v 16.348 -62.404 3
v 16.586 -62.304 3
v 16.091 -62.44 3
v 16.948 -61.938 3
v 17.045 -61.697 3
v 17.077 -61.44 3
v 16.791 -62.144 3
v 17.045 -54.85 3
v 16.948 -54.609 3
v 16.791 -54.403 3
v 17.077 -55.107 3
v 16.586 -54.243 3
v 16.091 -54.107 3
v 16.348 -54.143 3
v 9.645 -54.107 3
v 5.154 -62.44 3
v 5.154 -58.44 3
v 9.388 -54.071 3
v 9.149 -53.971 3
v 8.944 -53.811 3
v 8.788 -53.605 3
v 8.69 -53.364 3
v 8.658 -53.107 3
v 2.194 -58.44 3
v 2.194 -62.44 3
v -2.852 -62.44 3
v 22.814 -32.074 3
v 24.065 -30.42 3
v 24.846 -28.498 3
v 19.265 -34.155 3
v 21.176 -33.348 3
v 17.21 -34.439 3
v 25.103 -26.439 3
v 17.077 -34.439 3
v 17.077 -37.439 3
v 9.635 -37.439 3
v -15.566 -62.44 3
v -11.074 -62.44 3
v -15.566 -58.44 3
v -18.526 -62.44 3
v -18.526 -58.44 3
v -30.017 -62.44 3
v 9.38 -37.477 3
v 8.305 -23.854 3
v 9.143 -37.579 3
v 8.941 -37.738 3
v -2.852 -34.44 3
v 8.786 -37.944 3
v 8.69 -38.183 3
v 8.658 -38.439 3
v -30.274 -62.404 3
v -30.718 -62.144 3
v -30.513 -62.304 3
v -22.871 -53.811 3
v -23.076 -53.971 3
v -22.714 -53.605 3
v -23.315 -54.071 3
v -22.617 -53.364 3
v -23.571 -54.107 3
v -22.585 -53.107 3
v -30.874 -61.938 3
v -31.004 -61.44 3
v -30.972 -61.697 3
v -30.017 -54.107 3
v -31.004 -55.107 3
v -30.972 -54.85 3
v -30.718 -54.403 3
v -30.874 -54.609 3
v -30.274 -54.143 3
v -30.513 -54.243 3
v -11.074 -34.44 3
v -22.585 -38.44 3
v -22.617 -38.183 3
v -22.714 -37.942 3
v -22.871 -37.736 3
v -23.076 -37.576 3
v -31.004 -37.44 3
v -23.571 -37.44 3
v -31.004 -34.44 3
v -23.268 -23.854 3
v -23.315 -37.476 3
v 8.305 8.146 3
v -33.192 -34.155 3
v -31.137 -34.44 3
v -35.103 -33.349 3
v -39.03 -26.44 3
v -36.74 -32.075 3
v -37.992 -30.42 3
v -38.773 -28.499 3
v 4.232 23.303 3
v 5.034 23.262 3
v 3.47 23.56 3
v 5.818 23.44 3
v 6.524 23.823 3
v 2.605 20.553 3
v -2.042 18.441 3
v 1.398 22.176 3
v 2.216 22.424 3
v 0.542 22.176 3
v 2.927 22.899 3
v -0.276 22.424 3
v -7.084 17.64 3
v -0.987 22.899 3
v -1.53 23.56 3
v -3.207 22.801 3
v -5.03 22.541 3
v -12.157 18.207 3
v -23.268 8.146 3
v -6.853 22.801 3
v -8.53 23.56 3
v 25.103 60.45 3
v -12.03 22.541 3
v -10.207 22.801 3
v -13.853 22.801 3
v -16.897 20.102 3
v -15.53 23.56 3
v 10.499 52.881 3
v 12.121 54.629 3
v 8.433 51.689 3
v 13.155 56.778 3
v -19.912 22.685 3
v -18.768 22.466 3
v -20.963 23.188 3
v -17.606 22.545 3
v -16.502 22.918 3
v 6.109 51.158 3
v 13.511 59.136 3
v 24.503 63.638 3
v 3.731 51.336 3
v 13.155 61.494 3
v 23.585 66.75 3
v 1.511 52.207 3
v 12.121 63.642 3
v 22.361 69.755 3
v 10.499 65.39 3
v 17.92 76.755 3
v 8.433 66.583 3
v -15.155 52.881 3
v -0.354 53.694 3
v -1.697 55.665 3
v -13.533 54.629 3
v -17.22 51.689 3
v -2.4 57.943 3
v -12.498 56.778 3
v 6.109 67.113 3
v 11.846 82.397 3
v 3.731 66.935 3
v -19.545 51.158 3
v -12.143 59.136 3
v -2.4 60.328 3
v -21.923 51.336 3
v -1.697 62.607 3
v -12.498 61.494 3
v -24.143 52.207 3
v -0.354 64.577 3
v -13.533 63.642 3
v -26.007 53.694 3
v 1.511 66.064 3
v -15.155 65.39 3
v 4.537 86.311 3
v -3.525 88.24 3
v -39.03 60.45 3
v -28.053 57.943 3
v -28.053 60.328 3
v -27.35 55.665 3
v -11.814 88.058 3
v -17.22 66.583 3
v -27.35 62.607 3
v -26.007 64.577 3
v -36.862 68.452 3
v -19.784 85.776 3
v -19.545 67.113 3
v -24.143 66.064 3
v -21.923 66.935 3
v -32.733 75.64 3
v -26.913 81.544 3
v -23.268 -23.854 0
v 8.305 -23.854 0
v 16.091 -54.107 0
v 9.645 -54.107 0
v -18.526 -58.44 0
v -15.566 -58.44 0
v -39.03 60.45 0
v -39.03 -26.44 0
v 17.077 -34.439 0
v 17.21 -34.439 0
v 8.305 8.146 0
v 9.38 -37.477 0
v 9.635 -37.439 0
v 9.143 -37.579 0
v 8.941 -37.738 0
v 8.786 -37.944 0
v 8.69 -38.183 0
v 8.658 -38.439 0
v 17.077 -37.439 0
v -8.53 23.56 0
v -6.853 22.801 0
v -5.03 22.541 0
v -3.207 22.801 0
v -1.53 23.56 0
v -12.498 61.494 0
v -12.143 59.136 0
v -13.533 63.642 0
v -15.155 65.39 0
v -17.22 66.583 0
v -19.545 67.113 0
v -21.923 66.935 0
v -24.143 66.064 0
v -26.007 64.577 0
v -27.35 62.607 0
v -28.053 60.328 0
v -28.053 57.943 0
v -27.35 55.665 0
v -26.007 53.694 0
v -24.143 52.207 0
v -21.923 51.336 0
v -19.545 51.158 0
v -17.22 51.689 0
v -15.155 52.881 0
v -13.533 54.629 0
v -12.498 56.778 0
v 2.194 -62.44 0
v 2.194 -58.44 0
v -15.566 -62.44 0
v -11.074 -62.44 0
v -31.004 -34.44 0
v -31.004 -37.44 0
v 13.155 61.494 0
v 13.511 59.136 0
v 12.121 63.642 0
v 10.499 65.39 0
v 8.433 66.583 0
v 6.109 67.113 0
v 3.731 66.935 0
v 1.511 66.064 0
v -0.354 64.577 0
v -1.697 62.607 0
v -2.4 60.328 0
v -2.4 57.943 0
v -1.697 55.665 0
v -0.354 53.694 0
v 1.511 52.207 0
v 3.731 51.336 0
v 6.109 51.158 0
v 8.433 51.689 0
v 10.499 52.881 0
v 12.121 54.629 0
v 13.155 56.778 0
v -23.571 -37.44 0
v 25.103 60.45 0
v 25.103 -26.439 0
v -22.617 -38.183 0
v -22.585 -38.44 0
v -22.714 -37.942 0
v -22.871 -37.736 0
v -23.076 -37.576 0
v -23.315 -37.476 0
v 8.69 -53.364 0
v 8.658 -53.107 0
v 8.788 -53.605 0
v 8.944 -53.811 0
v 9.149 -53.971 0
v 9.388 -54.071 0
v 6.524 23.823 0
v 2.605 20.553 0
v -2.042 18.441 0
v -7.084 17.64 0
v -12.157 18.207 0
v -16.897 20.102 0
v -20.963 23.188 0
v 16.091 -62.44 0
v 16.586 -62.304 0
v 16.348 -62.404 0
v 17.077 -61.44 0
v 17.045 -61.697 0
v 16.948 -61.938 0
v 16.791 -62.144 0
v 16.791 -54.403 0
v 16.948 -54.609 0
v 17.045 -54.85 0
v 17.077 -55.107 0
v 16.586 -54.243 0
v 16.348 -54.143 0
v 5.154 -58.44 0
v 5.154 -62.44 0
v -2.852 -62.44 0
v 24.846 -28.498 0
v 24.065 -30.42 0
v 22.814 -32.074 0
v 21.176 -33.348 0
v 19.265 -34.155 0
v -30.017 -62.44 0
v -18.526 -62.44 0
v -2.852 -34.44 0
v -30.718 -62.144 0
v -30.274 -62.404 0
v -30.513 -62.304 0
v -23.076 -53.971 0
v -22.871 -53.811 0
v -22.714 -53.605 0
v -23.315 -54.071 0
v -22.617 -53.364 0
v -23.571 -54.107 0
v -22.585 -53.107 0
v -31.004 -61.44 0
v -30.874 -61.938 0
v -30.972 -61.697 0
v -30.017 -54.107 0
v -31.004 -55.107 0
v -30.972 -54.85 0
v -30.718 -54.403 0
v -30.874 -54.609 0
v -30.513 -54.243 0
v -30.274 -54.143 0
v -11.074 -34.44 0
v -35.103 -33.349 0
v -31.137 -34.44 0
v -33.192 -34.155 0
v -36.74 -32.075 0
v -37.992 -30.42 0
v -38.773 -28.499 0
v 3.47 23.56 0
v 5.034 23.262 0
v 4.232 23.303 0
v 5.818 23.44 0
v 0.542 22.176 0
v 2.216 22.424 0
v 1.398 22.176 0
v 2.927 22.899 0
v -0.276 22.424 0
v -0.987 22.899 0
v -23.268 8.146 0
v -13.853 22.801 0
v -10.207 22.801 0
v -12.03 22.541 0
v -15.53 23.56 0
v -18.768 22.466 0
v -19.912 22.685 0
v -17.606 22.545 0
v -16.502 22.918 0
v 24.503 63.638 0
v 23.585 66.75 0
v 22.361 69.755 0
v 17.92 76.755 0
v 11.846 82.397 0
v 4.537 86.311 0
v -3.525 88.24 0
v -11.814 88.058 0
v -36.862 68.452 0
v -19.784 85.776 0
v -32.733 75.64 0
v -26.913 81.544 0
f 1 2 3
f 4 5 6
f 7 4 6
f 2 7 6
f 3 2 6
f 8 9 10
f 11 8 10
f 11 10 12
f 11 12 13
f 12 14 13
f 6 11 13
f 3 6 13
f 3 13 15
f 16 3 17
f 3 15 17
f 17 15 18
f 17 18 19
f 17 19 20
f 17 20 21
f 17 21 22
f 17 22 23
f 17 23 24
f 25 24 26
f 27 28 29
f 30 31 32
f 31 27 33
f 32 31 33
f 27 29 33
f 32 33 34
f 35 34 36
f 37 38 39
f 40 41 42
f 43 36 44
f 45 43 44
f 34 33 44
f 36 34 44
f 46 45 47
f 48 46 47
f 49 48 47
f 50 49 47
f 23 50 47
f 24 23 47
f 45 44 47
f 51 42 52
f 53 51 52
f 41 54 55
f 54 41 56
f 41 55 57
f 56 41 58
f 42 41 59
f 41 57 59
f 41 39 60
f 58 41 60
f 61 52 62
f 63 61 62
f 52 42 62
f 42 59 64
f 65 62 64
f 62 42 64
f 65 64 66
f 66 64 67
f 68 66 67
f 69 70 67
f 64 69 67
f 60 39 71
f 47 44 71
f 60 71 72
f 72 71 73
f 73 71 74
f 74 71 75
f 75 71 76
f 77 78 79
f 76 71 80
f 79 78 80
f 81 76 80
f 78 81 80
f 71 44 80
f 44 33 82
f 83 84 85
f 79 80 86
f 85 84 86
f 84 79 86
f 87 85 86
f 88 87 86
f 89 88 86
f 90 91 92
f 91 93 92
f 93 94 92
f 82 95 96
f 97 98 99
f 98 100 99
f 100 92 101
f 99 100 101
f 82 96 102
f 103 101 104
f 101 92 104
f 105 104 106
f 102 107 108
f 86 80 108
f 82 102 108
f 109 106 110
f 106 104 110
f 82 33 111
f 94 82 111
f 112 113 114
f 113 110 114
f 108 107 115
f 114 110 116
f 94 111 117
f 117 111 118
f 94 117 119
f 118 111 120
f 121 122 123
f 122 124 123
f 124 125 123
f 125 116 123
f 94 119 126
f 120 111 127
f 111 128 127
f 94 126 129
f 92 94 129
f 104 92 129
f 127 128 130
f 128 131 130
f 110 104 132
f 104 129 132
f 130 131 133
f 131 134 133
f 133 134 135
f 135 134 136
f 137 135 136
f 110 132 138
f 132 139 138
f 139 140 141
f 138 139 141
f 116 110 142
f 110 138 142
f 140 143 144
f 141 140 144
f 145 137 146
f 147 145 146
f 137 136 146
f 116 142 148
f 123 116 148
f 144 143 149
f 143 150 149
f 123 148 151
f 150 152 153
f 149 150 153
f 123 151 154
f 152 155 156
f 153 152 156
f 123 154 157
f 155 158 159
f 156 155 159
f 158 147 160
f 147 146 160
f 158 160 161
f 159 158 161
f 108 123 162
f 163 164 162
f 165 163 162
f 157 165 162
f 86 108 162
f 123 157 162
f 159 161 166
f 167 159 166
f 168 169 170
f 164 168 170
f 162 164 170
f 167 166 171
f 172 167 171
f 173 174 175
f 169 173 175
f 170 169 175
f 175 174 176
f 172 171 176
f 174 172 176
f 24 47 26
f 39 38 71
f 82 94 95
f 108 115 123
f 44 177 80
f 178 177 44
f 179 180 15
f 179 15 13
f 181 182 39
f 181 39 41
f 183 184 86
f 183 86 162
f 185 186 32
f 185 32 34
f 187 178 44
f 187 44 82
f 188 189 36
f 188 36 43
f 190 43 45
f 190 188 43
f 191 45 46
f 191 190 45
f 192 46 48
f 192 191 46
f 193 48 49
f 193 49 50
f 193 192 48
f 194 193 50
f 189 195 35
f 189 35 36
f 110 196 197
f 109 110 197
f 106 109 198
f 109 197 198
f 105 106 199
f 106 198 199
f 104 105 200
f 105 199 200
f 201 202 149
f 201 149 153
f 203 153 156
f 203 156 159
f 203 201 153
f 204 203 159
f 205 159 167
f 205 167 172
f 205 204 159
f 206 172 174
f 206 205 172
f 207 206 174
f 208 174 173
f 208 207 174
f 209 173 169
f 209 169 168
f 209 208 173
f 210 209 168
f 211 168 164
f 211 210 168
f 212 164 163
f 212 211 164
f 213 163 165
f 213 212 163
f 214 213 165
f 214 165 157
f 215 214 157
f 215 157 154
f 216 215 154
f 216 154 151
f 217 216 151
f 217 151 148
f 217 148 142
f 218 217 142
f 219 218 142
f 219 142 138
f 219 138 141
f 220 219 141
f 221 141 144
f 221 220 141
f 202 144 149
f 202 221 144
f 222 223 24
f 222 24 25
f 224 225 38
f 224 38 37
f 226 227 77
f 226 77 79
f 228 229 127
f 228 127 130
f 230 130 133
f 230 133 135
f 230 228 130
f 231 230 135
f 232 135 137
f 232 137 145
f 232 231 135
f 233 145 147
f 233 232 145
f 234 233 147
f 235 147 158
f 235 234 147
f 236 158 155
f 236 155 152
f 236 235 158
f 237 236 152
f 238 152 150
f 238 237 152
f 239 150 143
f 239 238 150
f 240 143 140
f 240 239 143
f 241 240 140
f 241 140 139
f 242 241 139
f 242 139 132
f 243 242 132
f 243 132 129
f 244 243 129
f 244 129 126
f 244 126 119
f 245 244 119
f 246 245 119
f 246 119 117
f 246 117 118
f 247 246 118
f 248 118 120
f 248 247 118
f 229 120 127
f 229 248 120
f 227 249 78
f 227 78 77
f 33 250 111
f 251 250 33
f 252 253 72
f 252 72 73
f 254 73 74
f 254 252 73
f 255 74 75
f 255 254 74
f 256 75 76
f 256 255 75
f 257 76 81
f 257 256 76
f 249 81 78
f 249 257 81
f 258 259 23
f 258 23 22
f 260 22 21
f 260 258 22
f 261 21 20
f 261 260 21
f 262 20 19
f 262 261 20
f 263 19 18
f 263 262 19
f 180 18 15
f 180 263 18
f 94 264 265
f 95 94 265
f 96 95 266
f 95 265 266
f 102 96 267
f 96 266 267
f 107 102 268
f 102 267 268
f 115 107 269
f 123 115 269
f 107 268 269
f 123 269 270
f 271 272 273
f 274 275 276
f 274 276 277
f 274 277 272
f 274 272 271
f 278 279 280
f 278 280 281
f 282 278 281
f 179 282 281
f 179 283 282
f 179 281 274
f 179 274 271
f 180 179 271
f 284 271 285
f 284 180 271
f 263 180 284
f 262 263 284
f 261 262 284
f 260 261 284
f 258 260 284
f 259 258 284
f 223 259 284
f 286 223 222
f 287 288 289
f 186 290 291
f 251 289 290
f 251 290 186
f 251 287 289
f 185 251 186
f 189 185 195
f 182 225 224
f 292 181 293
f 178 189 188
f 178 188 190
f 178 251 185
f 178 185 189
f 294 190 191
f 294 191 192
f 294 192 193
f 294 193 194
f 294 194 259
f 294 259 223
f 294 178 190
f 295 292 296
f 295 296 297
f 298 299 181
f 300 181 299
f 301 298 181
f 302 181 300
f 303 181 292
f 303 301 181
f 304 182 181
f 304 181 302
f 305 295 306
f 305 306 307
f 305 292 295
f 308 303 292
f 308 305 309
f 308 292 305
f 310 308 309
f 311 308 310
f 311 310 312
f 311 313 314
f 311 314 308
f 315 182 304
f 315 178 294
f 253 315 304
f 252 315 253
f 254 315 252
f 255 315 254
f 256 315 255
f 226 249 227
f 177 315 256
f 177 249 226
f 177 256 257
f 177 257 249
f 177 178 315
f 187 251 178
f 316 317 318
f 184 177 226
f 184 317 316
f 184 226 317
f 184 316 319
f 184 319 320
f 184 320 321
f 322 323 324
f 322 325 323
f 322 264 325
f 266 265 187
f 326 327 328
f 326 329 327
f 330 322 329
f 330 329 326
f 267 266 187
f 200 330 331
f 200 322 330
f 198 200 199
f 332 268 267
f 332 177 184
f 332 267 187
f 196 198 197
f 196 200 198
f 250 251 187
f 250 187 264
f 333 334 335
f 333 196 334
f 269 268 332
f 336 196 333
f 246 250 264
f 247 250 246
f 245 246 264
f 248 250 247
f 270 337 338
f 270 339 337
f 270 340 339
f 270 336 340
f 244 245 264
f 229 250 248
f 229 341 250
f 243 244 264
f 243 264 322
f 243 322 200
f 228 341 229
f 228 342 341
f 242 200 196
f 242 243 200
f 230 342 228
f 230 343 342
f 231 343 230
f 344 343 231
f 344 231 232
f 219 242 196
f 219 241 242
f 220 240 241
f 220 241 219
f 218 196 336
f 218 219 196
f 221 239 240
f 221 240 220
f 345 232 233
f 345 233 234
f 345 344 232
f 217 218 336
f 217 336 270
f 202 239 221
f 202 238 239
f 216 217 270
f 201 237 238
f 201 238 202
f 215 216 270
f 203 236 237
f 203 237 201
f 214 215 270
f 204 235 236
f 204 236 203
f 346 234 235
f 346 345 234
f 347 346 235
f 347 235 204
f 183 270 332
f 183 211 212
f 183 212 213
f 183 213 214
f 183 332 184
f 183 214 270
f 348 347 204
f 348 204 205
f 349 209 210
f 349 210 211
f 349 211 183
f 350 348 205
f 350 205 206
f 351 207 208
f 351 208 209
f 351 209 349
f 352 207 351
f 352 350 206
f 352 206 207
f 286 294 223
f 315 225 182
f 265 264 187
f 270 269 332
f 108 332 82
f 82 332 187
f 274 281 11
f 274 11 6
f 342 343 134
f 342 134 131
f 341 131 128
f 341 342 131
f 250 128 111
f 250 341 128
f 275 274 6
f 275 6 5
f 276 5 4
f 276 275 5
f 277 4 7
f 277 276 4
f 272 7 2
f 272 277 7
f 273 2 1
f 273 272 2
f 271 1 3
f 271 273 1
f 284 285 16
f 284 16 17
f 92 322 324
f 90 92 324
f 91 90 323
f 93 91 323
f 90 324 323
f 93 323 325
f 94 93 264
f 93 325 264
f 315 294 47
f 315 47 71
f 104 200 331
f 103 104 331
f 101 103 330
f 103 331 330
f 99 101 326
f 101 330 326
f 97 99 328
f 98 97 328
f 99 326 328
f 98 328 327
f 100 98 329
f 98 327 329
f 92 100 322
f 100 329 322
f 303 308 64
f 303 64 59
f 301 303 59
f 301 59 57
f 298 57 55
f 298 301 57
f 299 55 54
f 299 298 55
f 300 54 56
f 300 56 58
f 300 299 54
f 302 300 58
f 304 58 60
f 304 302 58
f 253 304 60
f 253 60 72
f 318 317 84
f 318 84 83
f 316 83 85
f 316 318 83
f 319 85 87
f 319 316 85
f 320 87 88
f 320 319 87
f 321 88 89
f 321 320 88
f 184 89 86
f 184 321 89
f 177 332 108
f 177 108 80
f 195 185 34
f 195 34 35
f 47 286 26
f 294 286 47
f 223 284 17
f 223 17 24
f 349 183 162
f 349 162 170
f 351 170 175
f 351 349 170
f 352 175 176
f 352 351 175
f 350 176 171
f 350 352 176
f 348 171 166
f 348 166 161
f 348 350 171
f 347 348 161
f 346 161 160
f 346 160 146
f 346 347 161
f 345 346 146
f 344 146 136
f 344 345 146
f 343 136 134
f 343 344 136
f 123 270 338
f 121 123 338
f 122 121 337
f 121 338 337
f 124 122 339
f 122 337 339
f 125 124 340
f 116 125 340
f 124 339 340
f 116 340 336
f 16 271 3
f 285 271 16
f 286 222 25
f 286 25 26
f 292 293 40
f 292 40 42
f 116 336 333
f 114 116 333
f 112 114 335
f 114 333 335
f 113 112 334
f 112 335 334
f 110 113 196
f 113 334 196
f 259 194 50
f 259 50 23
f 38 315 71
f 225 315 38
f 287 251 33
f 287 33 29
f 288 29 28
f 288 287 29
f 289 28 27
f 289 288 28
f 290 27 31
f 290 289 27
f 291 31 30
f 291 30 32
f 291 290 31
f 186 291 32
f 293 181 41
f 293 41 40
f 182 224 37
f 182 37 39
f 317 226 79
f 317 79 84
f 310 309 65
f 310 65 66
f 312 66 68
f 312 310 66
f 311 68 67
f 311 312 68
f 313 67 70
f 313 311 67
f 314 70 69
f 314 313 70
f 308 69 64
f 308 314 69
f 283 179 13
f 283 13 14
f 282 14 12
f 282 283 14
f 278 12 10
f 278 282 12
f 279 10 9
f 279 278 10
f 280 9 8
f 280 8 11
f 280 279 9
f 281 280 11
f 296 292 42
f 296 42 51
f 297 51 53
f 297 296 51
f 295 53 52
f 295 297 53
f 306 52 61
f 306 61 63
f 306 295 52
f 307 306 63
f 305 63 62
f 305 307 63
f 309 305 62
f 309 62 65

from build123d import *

# Parameters (mm, degrees)
MODEL_R                 = 8
SALIENTE_EXTRUIR1_DEPTH = 3


with BuildPart() as part:
    # Model → Saliente-Extruir1 (new body)
    with BuildSketch(Plane.XY):
        with BuildLine():
            Line((25.103364369, 60.449776828), (25.103364369, 55.560048431))
            Line((25.103364369, 55.560048431), (25.103364369, -26.439158767))
            ThreePointArc((25.103364369, -26.439158767), (22.813551952, -32.073921627), (17.210031036, -34.439158767))
            Line((17.210031036, -34.439158767), (17.077324369, -34.439158767))
            Line((17.077324369, -34.439158767), (17.077324369, -36.439158767))
            Line((17.077324369, -36.439158767), (17.077324369, -37.439158767))
            Line((17.077324369, -37.439158767), (9.634620202, -37.439158767))
            ThreePointArc((9.634620202, -37.439158767), (8.940767121, -37.73835668), (8.658097702, -38.439105914))
            Line((8.658097702, -38.439105914), (8.658097702, -53.106951569))
            ThreePointArc((8.658097702, -53.106951569), (8.944324254, -53.811296927), (9.644764369, -54.106951569))
            Line((9.644764369, -54.106951569), (16.090657702, -54.106951569))
            ThreePointArc((16.090657702, -54.106951569), (16.791097817, -54.402606212), (17.077324369, -55.106951569))
            Line((17.077324369, -55.106951569), (17.077324369, -61.439951569))
            ThreePointArc((17.077324369, -61.439951569), (16.791097817, -62.144296927), (16.090657702, -62.439951569))
            Line((16.090657702, -62.439951569), (5.154444792, -62.439951569))
            Line((5.154444792, -62.439951569), (5.154444792, -58.439951569))
            Line((5.154444792, -58.439951569), (2.194444792, -58.439951569))
            Line((2.194444792, -58.439951569), (2.194444792, -62.439951569))
            Line((2.194444792, -62.439951569), (-2.852355631, -62.439951569))
            Line((-2.852355631, -62.439951569), (-2.852355631, -34.439951569))
            Line((-2.852355631, -34.439951569), (-11.074248964, -34.439951569))
            Line((-11.074248964, -34.439951569), (-11.074248964, -62.439951569))
            Line((-11.074248964, -62.439951569), (-15.565555208, -62.439951569))
            Line((-15.565555208, -62.439951569), (-15.565555208, -58.439951569))
            Line((-15.565555208, -58.439951569), (-18.525555208, -58.439951569))
            Line((-18.525555208, -58.439951569), (-18.525555208, -62.439951569))
            Line((-18.525555208, -62.439951569), (-30.017262298, -62.439951569))
            ThreePointArc((-30.017262298, -62.439951569), (-30.717702412, -62.144296927), (-31.003928964, -61.439951569))
            Line((-31.003928964, -61.439951569), (-31.003928964, -55.106951569))
            ThreePointArc((-31.003928964, -55.106951569), (-30.717702412, -54.402606212), (-30.017262298, -54.106951569))
            Line((-30.017262298, -54.106951569), (-23.571368964, -54.106951569))
            ThreePointArc((-23.571368964, -54.106951569), (-22.87092885, -53.811296927), (-22.584702298, -53.106951569))
            Line((-22.584702298, -53.106951569), (-22.584702298, -38.439951569))
            ThreePointArc((-22.584702298, -38.439951569), (-22.87092885, -37.735606212), (-23.571368964, -37.439951569))
            Line((-23.571368964, -37.439951569), (-31.003928964, -37.439951569))
            Line((-31.003928964, -37.439951569), (-31.003928964, -34.439951569))
            Line((-31.003928964, -34.439951569), (-31.136635631, -34.439951569))
            ThreePointArc((-31.136635631, -34.439951569), (-36.740156547, -32.074714429), (-39.029968964, -26.439951569))
            Line((-39.029968964, -26.439951569), (-39.029968964, 60.449776828))
            ThreePointArc((-39.029968964, 60.449776828), (-11.813715639, 88.05803587), (22.36143002, 69.755035253))
            ThreePointArc((22.36143002, 69.755035253), (24.083000637, 65.205716618), (25.103364369, 60.449776828))
        make_face()
        with Locations((5.510677067, 59.135571807)):
            Circle(MODEL_R, mode=Mode.SUBTRACT)
        with Locations((-20.142656266, 59.135571807)):
            Circle(MODEL_R, mode=Mode.SUBTRACT)
        Polygon((8.30541929, 8.146386979), (-6.981247377, 8.146386979), (-23.267914044, 8.146386979), (-23.267914044, -23.853613021), (8.30541929, -23.853613021), align=None, mode=Mode.SUBTRACT)
        with BuildLine():
            ThreePointArc((3.470031036, 23.560048431), (5.034204267, 23.261828431), (6.524349919, 23.823111786))
            ThreePointArc((6.524349919, 23.823111786), (-7.083808204, 17.640131856), (-20.962959728, 23.188137015))
            ThreePointArc((-20.962959728, 23.188137015), (-18.18444232, 22.468056811), (-15.529968964, 23.560048431))
            ThreePointArc((-15.529968964, 23.560048431), (-12.029968964, 22.540846026), (-8.529968964, 23.560048431))
            ThreePointArc((-8.529968964, 23.560048431), (-5.029968964, 22.540846026), (-1.529968964, 23.560048431))
            ThreePointArc((-1.529968964, 23.560048431), (0.970031036, 22.144572483), (3.470031036, 23.560048431))
        make_face(mode=Mode.SUBTRACT)
    extrude(amount=SALIENTE_EXTRUIR1_DEPTH)


solid = part.part
